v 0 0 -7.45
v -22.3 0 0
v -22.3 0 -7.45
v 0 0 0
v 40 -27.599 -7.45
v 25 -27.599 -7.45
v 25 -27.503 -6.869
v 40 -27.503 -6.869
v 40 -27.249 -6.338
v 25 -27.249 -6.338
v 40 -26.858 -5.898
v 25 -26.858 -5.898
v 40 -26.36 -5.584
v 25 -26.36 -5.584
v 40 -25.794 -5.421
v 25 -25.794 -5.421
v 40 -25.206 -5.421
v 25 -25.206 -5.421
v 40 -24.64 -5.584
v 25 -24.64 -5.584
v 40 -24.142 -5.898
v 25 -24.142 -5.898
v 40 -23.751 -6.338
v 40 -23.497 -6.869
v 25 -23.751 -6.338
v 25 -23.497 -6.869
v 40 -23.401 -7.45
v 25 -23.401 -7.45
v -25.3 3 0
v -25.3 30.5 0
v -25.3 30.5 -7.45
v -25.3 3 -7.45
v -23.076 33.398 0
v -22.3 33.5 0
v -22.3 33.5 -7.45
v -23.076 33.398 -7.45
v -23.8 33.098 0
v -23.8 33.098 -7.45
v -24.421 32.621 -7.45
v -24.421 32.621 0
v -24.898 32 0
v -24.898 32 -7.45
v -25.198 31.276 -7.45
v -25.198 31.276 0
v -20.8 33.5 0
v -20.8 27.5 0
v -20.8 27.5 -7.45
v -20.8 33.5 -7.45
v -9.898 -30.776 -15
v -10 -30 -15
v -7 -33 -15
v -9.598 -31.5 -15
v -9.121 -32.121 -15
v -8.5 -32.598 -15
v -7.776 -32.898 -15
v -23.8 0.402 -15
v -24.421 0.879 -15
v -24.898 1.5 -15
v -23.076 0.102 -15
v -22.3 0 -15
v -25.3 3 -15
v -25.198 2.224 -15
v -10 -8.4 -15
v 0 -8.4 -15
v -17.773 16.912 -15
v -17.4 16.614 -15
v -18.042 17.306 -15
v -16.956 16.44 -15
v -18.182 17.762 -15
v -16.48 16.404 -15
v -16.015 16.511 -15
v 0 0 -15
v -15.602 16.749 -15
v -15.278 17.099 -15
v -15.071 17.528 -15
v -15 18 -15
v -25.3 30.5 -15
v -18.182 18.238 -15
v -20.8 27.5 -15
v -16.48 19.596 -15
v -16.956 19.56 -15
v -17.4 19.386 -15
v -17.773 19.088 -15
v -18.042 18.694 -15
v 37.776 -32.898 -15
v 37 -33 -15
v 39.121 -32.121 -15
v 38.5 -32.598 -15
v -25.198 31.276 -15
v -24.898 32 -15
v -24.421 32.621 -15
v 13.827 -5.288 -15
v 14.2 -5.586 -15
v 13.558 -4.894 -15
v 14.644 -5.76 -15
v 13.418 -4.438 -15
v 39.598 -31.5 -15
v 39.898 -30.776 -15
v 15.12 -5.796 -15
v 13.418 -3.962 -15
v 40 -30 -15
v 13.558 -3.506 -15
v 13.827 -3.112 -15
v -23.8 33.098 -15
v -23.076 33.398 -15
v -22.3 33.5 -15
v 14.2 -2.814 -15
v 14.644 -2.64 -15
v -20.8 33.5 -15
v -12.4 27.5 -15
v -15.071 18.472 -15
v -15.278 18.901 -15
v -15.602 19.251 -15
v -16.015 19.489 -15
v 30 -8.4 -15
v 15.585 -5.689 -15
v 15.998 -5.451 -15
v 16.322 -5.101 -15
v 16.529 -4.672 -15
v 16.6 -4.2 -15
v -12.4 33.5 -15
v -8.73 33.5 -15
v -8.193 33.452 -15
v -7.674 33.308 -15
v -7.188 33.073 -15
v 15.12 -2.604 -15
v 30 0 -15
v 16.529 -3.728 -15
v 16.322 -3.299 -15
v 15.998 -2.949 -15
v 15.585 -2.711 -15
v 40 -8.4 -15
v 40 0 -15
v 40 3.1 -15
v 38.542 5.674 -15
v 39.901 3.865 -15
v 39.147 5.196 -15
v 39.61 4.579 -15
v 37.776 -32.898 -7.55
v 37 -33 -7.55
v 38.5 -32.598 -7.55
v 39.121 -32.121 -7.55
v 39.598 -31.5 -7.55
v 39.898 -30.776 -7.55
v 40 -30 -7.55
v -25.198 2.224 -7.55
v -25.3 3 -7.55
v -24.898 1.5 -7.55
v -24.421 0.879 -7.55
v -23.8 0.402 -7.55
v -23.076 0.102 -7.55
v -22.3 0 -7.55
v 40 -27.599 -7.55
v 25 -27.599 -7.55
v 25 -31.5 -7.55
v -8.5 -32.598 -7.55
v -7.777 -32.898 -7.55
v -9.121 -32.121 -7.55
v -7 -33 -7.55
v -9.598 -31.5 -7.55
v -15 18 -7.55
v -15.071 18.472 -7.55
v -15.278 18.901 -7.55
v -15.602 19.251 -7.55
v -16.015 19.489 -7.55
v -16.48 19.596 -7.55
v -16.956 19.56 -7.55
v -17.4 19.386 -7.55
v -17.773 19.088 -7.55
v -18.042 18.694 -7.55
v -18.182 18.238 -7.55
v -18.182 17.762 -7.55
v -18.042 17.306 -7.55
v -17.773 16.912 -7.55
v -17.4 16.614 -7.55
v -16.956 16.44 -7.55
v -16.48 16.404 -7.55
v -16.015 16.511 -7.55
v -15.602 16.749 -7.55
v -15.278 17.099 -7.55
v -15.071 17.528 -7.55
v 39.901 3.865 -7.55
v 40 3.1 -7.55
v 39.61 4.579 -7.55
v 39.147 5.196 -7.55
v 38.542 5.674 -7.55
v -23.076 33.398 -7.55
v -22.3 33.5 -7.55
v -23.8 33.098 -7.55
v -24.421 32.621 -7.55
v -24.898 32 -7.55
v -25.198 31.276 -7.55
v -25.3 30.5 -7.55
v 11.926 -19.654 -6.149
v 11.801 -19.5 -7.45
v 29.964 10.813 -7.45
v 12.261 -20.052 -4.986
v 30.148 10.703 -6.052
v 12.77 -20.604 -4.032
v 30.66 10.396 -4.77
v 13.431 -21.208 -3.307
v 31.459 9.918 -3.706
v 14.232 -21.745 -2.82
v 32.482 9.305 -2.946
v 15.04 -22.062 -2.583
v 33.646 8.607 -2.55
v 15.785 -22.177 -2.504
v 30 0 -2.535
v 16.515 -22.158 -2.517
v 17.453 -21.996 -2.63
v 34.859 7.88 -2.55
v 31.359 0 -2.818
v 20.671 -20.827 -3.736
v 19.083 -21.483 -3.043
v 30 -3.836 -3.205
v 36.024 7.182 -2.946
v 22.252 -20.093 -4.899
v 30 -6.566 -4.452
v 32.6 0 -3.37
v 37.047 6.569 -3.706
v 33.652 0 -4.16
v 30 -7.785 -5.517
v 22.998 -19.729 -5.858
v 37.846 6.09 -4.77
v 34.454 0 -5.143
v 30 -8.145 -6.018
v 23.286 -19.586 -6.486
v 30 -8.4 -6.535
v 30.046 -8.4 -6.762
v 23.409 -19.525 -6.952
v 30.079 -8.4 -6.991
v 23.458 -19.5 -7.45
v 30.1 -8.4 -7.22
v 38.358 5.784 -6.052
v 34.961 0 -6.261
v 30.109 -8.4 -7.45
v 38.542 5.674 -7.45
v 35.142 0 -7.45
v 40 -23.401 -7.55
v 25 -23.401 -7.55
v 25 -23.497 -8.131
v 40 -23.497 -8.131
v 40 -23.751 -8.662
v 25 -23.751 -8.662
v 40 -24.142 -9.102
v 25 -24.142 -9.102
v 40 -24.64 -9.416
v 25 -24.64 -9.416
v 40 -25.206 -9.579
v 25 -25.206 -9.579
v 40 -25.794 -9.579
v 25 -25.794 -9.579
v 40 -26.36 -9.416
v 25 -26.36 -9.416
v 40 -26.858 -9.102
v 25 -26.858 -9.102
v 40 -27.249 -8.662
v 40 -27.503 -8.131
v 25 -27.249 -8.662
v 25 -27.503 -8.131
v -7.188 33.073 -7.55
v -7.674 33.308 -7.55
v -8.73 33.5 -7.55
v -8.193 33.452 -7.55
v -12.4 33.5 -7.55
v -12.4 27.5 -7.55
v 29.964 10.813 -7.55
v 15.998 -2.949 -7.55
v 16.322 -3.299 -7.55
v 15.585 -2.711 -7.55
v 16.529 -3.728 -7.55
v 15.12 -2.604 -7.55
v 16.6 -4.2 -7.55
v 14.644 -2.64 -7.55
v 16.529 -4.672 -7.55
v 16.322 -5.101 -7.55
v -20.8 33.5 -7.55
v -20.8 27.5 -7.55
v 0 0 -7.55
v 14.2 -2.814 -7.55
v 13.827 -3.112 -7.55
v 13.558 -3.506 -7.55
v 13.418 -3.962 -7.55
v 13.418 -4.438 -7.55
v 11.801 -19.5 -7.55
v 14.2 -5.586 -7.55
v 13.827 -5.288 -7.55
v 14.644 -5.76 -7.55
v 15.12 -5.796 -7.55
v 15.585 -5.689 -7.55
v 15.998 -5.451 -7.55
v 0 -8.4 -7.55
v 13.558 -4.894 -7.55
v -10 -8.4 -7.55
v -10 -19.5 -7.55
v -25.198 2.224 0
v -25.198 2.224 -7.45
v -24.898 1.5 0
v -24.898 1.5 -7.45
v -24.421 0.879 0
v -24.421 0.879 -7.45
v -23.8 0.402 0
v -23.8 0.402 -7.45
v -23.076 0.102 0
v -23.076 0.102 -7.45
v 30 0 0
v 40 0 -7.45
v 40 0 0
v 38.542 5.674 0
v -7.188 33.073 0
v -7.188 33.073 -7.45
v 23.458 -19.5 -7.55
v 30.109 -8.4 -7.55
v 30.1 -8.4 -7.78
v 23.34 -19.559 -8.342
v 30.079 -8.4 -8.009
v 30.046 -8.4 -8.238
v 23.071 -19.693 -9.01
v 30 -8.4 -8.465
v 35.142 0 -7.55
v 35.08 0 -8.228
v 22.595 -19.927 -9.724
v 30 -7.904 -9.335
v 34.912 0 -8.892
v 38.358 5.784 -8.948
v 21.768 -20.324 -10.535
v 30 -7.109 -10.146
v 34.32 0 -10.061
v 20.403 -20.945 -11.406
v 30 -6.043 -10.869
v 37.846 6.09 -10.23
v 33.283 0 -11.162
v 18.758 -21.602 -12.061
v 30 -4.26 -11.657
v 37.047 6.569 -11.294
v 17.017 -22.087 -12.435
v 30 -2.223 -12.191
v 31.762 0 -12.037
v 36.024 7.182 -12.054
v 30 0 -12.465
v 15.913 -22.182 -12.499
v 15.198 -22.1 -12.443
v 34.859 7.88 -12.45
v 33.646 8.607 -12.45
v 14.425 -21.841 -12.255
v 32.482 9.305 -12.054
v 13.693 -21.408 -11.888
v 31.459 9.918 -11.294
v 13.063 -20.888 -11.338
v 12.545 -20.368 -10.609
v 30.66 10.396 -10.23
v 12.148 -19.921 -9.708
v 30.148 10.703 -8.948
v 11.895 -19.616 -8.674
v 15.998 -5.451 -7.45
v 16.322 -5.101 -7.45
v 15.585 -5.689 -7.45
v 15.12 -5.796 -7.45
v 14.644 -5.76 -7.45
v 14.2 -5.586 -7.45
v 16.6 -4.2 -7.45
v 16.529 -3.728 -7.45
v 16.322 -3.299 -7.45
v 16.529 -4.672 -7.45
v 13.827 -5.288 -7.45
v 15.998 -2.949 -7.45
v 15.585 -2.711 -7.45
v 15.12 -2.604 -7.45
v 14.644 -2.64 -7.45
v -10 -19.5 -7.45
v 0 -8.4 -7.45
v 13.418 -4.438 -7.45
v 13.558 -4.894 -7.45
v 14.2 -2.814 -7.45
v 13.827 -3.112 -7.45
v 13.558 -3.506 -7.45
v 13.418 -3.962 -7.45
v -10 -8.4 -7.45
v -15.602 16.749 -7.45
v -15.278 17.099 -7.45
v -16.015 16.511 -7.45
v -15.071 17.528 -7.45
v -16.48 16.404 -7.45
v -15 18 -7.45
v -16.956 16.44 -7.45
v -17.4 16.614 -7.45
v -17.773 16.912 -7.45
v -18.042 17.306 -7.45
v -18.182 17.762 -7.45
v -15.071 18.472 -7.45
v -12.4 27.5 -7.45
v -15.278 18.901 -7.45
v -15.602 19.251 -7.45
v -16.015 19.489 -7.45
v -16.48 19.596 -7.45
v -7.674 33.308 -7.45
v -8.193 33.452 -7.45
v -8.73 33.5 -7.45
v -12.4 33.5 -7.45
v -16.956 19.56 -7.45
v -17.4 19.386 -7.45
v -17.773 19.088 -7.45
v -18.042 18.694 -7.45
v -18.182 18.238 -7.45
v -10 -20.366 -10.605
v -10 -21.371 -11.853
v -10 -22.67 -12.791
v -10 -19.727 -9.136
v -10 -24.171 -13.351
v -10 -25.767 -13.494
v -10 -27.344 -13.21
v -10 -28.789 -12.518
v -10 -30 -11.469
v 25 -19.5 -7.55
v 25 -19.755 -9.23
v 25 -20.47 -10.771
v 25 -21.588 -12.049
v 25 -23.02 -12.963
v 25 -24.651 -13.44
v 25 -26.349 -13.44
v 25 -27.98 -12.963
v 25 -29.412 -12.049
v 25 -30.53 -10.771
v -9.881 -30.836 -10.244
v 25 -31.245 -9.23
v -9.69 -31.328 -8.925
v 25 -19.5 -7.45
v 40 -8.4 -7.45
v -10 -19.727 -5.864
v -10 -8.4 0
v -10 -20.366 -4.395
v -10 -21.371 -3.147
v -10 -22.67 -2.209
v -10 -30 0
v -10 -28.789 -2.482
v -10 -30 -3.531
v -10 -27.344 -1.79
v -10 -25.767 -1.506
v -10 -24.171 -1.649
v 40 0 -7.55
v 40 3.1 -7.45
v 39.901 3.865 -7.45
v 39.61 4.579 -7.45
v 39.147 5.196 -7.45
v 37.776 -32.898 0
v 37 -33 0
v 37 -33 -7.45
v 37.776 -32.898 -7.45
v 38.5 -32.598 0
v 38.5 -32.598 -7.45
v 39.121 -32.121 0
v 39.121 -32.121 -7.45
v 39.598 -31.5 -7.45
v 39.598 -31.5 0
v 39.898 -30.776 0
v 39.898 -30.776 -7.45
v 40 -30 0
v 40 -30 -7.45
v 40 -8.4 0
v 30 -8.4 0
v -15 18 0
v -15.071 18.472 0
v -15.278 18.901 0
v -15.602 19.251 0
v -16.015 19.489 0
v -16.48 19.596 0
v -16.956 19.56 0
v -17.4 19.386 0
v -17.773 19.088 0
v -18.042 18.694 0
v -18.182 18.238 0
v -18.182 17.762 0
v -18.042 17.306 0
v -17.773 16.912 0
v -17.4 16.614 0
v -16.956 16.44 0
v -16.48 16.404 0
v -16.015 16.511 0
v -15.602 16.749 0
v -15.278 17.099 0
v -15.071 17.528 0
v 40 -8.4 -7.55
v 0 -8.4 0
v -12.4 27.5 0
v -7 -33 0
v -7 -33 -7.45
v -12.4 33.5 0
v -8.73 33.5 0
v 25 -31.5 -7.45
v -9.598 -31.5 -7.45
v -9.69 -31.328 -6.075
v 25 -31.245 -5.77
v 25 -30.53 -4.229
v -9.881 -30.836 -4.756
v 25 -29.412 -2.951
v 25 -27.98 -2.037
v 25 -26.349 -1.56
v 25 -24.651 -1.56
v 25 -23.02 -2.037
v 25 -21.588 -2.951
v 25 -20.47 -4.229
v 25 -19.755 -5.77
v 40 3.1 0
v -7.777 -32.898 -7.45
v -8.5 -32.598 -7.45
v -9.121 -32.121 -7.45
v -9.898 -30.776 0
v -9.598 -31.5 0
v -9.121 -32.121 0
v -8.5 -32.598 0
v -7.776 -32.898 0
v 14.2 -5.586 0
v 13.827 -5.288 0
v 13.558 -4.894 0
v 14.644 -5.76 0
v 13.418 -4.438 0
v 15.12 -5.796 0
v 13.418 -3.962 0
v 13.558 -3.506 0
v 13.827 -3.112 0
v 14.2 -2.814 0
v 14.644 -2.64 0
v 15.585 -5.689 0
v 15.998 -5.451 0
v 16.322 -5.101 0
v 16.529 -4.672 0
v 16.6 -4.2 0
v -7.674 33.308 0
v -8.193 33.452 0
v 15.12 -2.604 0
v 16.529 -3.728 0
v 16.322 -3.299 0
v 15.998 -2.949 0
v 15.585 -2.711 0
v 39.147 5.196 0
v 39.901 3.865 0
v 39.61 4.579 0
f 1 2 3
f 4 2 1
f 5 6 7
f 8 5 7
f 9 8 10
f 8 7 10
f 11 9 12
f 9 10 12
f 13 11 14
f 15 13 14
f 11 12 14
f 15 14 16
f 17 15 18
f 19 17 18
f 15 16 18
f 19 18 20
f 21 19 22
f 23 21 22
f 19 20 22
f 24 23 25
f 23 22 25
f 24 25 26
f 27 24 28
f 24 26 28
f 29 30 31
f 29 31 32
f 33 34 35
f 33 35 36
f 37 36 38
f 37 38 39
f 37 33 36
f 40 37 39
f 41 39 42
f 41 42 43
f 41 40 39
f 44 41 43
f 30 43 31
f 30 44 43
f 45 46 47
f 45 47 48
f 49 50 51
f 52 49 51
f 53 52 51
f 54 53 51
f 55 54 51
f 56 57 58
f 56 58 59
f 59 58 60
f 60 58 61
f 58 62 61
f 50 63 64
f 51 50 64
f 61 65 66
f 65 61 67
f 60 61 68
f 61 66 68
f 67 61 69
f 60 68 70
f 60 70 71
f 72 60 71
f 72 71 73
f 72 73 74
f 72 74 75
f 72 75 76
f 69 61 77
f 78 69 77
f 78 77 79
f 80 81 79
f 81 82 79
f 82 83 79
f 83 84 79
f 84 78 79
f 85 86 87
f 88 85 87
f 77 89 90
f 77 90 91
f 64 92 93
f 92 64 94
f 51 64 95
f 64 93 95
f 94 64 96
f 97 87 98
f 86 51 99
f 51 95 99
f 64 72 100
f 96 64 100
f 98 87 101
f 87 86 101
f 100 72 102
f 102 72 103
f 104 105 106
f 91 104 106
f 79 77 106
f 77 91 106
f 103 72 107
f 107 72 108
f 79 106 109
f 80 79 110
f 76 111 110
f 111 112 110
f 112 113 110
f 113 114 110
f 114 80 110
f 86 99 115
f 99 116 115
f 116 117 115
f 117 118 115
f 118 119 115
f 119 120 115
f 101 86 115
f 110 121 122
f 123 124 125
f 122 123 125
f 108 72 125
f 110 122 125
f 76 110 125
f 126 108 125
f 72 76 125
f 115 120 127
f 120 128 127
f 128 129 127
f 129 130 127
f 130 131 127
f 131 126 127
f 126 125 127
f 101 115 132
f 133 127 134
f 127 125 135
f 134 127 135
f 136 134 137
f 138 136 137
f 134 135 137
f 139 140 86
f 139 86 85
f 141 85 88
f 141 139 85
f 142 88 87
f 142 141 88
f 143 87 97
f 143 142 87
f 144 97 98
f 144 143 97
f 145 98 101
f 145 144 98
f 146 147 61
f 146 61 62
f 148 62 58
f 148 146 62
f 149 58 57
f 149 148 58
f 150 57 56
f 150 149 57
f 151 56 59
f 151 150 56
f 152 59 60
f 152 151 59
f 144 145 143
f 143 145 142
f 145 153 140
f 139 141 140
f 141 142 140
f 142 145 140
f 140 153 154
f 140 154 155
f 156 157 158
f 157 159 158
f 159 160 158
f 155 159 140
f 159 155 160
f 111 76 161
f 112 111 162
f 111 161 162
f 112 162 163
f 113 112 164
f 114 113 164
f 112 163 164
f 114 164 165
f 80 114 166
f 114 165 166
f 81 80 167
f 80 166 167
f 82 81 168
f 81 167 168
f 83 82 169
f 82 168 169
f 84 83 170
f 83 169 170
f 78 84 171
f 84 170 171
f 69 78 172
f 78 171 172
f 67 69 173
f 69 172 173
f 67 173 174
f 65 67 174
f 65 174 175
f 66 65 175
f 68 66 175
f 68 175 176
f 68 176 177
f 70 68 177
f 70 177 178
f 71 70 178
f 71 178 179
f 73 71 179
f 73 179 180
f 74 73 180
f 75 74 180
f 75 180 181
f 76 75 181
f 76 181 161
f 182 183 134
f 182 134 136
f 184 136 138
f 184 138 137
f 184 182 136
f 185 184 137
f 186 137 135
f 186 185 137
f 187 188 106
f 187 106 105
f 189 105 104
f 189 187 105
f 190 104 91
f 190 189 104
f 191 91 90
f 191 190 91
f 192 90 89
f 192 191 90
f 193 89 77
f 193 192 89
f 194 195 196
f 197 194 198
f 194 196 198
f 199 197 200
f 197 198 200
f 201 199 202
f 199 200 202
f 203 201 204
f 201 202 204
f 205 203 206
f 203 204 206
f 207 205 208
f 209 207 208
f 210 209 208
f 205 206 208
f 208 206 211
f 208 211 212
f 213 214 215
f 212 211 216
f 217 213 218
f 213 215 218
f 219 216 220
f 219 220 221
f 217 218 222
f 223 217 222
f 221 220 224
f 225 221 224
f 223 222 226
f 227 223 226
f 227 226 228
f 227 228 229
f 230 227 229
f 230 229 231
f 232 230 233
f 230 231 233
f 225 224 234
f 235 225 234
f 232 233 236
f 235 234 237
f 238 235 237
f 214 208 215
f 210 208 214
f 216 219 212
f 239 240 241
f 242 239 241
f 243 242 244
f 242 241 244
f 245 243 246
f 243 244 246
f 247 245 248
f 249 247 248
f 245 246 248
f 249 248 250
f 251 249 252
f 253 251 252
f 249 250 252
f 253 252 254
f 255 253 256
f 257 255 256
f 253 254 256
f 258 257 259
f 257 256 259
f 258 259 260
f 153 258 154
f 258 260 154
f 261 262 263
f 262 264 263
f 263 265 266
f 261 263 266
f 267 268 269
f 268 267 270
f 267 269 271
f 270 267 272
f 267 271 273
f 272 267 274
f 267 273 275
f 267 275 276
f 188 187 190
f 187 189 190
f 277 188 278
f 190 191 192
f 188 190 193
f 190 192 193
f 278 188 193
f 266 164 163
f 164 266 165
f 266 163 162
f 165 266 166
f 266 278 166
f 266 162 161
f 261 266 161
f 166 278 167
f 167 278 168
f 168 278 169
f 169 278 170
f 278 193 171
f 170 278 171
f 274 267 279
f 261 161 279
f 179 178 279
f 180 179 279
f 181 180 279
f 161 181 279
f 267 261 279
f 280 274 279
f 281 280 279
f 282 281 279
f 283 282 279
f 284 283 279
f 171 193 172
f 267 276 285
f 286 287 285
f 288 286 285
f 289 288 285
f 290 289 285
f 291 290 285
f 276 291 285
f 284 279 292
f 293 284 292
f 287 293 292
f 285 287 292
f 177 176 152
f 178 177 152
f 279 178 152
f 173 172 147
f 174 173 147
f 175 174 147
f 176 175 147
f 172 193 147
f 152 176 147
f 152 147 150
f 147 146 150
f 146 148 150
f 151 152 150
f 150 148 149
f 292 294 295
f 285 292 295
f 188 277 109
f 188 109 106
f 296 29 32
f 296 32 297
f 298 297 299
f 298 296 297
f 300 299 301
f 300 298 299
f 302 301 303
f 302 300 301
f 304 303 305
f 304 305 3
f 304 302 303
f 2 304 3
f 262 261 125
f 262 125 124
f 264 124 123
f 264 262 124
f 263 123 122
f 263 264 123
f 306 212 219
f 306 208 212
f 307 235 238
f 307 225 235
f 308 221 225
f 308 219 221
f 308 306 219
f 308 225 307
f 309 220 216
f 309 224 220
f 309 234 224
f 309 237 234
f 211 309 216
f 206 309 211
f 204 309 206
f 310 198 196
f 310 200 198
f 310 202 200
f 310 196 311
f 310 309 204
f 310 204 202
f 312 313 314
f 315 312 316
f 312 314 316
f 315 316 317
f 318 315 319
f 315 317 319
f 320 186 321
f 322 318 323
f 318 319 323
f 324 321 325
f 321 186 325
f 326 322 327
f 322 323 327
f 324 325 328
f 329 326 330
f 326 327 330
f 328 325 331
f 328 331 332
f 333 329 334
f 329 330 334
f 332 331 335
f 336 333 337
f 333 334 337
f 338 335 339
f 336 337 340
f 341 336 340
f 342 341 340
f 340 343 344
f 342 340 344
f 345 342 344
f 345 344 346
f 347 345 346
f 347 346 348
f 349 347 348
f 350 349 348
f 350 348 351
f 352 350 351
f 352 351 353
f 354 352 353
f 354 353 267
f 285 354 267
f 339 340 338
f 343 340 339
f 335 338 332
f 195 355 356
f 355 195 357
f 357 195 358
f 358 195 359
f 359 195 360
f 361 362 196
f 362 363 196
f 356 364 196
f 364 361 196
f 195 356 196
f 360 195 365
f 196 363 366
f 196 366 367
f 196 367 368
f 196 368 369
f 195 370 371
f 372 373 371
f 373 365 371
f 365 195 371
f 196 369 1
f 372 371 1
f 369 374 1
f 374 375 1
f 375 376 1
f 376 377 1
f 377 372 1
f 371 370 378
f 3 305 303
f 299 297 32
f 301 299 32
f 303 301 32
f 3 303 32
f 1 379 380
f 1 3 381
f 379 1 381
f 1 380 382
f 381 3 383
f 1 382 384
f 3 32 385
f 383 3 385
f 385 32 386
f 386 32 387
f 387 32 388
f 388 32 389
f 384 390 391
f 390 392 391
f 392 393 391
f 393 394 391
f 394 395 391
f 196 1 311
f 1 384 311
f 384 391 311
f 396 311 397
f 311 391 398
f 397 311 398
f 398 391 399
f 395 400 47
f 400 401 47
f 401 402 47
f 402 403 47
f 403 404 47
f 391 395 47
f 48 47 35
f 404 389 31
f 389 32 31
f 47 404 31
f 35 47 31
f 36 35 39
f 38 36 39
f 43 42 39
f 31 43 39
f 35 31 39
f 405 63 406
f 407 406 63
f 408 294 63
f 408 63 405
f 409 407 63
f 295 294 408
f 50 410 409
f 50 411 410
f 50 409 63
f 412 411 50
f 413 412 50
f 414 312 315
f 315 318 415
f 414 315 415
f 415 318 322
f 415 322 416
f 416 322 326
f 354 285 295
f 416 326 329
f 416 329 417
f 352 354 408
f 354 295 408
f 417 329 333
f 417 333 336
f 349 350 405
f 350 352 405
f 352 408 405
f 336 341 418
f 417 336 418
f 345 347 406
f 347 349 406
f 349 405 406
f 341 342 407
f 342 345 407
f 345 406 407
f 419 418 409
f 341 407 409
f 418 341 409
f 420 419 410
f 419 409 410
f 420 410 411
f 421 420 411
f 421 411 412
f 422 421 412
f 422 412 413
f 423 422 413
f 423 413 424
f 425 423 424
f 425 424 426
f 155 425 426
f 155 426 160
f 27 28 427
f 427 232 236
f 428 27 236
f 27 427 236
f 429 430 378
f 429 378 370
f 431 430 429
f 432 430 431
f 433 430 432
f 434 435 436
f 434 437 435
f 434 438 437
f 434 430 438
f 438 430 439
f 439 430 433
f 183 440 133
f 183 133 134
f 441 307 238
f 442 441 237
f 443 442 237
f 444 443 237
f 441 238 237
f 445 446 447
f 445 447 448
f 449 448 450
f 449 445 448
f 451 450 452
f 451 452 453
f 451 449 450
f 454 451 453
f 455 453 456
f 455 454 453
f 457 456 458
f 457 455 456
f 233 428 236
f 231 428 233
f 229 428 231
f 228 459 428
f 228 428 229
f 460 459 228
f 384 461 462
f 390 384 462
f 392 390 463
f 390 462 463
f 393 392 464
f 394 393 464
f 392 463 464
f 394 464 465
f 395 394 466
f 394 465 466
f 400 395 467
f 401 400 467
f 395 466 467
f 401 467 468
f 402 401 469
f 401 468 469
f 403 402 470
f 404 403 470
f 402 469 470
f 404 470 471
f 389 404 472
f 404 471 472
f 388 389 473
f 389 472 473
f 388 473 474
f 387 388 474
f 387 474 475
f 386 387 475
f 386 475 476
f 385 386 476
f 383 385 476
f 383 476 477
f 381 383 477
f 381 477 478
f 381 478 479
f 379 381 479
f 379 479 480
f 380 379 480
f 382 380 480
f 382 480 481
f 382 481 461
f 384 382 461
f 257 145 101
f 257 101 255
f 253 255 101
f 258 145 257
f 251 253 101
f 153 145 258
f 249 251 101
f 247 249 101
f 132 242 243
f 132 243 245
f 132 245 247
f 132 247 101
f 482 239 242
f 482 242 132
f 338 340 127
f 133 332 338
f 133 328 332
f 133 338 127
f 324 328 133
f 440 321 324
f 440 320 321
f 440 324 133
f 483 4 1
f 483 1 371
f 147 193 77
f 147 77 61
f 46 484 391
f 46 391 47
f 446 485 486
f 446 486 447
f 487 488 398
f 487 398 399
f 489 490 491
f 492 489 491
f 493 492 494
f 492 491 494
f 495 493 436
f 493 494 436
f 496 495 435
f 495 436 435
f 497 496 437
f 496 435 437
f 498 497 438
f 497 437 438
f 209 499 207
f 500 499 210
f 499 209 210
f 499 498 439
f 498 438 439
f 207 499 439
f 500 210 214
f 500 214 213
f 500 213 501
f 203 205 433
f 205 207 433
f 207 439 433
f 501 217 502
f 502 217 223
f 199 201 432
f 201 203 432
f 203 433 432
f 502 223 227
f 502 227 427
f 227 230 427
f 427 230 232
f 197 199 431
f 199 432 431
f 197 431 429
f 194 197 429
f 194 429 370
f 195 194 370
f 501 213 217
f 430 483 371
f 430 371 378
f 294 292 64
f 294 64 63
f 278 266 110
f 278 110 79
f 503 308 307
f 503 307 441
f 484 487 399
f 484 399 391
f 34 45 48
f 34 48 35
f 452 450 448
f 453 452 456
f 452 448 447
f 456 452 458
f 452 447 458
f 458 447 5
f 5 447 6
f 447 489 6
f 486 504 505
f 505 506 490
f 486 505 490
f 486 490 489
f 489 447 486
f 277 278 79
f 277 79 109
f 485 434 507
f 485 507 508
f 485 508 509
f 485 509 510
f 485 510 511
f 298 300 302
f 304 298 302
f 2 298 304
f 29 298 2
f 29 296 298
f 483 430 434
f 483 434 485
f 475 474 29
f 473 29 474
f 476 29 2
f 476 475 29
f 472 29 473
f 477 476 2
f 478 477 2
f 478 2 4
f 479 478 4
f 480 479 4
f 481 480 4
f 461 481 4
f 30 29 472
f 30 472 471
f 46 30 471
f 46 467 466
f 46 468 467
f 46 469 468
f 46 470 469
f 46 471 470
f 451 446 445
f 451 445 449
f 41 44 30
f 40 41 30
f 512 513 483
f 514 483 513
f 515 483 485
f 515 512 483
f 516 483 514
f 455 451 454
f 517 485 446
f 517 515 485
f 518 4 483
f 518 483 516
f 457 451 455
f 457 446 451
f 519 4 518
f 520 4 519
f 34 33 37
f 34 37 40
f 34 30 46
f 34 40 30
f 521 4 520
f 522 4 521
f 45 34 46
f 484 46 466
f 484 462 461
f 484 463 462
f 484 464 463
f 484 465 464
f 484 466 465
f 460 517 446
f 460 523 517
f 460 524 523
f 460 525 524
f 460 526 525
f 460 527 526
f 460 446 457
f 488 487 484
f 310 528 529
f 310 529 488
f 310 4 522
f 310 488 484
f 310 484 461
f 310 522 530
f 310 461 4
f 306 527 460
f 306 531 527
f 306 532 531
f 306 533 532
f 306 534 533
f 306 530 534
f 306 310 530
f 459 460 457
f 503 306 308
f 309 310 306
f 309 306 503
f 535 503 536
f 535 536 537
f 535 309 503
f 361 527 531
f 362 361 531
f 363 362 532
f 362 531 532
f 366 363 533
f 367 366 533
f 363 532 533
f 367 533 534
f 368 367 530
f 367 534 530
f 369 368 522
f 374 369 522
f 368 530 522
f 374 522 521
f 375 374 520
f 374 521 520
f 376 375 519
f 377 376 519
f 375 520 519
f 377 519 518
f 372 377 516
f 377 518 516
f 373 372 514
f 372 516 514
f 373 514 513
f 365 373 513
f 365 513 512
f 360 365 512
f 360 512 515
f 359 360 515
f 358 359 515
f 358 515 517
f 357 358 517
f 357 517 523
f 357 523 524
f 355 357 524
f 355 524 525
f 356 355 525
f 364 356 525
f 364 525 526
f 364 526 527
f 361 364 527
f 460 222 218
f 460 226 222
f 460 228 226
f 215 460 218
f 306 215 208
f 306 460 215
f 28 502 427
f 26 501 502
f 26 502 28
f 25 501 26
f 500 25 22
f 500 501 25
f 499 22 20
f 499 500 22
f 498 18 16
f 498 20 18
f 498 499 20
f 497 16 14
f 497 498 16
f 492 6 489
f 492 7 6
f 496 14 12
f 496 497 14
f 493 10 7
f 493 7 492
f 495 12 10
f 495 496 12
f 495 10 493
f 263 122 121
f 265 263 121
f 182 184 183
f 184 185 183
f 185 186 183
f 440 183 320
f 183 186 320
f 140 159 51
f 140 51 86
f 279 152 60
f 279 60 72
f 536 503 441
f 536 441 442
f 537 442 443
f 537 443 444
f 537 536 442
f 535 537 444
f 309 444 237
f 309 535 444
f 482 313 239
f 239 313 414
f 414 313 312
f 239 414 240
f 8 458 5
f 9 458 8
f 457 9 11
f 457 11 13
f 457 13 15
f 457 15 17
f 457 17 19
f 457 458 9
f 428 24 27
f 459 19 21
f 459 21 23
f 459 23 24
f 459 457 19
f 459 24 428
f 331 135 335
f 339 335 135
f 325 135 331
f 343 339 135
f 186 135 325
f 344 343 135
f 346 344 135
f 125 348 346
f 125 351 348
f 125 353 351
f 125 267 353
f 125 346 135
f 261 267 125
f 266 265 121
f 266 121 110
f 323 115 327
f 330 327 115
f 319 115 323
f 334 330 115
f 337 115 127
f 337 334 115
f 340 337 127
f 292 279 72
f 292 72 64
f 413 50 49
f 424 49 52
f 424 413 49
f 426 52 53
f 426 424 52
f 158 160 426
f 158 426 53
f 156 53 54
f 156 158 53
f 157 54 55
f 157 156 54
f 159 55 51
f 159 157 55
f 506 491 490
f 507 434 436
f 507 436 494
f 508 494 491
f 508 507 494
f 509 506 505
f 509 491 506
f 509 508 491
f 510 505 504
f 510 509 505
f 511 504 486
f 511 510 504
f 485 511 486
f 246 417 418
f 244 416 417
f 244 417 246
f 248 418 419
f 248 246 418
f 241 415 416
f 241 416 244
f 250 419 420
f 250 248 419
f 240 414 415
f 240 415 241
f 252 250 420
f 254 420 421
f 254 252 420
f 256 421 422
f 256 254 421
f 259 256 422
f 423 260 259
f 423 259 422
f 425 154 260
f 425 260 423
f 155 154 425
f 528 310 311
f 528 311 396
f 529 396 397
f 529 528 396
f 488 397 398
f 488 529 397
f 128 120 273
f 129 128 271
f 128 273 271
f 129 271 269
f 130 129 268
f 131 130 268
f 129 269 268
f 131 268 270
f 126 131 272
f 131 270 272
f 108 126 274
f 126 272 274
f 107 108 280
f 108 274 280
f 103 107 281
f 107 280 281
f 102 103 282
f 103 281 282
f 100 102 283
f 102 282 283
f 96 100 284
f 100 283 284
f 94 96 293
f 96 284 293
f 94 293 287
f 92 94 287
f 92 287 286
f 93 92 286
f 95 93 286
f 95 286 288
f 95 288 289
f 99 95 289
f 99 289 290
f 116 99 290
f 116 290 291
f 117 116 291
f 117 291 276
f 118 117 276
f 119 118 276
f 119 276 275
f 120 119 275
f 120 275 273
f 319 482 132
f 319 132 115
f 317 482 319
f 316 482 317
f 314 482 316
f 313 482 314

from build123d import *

# Parameters (mm, degrees)
F0_R     = 1.6
F1_DEPTH = 15
F2_R     = 6
F2_R_2   = 2.1
F3_DEPTH = 35
F4_DEPTH = 60
F6_DEPTH = 41
F7_W     = 45
F7_H     = 0.1
F7_W_2   = 27.5
F7_W_3   = 17.5
F8_DEPTH = 70


with BuildPart() as f1:
    # F0 (on Top) → F1 (new body)
    with BuildSketch(Plane.XY):
        with BuildLine():
            Line((30, 0), (40, 0))
            Line((40, 0), (40, 3.1002119088))
            ThreePointArc((40, 3.1002119088), (39.6101456364, 4.5791100651), (38.5419068287, 5.6736382884))
            Line((38.5419068287, 5.6736382884), (-7.1880530866, 33.0734263797))
            ThreePointArc((-7.1880530866, 33.0734263797), (-7.930047151, 33.3913905944), (-8.7299599153, 33.5))
            Line((-8.7299599153, 33.5), (-12.4, 33.5))
            Line((-12.4, 33.5), (-12.4, 27.5))
            Line((-12.4, 27.5), (-20.8, 27.5))
            Line((-20.8, 27.5), (-20.8, 33.5))
            Line((-20.8, 33.5), (-22.3, 33.5))
            ThreePointArc((-22.3, 33.5), (-24.4213203436, 32.6213203436), (-25.3, 30.5))
            Line((-25.3, 30.5), (-25.3, 3))
            ThreePointArc((-25.3, 3), (-24.4213203436, 0.8786796564), (-22.3, 0))
            Line((-22.3, 0), (0, 0))
            Line((0, 0), (0, -8.4))
            Line((0, -8.4), (-10, -8.4))
            Line((-10, -8.4), (-10, -30))
            ThreePointArc((-10, -30), (-9.1213203436, -32.1213203436), (-7, -33))
            Line((-7, -33), (37, -33))
            ThreePointArc((37, -33), (39.1213203436, -32.1213203436), (40, -30))
            Line((40, -30), (40, -8.4))
            Line((40, -8.4), (30, -8.4))
            Line((30, -8.4), (30, 0))
        make_face()
        with Locations((15, -4.2)):
            Circle(F0_R, mode=Mode.SUBTRACT)
        with Locations((-16.6, 18)):
            Circle(F0_R, mode=Mode.SUBTRACT)
    extrude(amount=-F1_DEPTH)

    # F2 (on face) → F3 (cut)
    with BuildSketch(Plane(origin=(-10, 0, 0), x_dir=(0, -1, 0), z_dir=(-1, 0, 0))):
        with Locations((25.5, -7.5)):
            Circle(F2_R)
        with Locations((25.5, -7.5)):
            Circle(F2_R_2, mode=Mode.SUBTRACT)
    extrude(amount=-F3_DEPTH, mode=Mode.SUBTRACT)

    # F2 (on face) → F4 (cut)
    with BuildSketch(Plane(origin=(-10, 0, 0), x_dir=(0, -1, 0), z_dir=(-1, 0, 0))):
        with Locations((25.5, -7.5)):
            Circle(F2_R_2)
    extrude(amount=-F4_DEPTH, mode=Mode.SUBTRACT)

    # F5 (on face) → F6 (cut)
    with BuildSketch(Plane(origin=(12.6828209487, 21.1674955903, 0), x_dir=(-0.8578087932, 0.5139689429, 0), z_dir=(0.5139689429, 0.8578087932, 0))):
        with BuildLine():
            ThreePointArc((-30.1455127116, -7.5), (-25.1455127116, -12.5), (-20.1455127116, -7.5))
            ThreePointArc((-20.1455127116, -7.5), (-25.1455127116, -2.5), (-30.1455127116, -7.5))
        make_face()
    extrude(amount=-F6_DEPTH, mode=Mode.SUBTRACT)

    # F7 (on face) → F8 (cut)
    with BuildSketch(Plane(origin=(-25.3, 0, 0), x_dir=(0, -1, 0), z_dir=(-1, 0, 0))):
        with Locations((19.5, -7.5)):
            Rectangle(F7_W, F7_H)
        with Locations((-16.75, -7.5)):
            Rectangle(F7_W_2, F7_H)
        with Locations((-39.25, -7.5)):
            Rectangle(F7_W_3, F7_H)
    extrude(amount=-F8_DEPTH, mode=Mode.SUBTRACT)


solid = f1.part
